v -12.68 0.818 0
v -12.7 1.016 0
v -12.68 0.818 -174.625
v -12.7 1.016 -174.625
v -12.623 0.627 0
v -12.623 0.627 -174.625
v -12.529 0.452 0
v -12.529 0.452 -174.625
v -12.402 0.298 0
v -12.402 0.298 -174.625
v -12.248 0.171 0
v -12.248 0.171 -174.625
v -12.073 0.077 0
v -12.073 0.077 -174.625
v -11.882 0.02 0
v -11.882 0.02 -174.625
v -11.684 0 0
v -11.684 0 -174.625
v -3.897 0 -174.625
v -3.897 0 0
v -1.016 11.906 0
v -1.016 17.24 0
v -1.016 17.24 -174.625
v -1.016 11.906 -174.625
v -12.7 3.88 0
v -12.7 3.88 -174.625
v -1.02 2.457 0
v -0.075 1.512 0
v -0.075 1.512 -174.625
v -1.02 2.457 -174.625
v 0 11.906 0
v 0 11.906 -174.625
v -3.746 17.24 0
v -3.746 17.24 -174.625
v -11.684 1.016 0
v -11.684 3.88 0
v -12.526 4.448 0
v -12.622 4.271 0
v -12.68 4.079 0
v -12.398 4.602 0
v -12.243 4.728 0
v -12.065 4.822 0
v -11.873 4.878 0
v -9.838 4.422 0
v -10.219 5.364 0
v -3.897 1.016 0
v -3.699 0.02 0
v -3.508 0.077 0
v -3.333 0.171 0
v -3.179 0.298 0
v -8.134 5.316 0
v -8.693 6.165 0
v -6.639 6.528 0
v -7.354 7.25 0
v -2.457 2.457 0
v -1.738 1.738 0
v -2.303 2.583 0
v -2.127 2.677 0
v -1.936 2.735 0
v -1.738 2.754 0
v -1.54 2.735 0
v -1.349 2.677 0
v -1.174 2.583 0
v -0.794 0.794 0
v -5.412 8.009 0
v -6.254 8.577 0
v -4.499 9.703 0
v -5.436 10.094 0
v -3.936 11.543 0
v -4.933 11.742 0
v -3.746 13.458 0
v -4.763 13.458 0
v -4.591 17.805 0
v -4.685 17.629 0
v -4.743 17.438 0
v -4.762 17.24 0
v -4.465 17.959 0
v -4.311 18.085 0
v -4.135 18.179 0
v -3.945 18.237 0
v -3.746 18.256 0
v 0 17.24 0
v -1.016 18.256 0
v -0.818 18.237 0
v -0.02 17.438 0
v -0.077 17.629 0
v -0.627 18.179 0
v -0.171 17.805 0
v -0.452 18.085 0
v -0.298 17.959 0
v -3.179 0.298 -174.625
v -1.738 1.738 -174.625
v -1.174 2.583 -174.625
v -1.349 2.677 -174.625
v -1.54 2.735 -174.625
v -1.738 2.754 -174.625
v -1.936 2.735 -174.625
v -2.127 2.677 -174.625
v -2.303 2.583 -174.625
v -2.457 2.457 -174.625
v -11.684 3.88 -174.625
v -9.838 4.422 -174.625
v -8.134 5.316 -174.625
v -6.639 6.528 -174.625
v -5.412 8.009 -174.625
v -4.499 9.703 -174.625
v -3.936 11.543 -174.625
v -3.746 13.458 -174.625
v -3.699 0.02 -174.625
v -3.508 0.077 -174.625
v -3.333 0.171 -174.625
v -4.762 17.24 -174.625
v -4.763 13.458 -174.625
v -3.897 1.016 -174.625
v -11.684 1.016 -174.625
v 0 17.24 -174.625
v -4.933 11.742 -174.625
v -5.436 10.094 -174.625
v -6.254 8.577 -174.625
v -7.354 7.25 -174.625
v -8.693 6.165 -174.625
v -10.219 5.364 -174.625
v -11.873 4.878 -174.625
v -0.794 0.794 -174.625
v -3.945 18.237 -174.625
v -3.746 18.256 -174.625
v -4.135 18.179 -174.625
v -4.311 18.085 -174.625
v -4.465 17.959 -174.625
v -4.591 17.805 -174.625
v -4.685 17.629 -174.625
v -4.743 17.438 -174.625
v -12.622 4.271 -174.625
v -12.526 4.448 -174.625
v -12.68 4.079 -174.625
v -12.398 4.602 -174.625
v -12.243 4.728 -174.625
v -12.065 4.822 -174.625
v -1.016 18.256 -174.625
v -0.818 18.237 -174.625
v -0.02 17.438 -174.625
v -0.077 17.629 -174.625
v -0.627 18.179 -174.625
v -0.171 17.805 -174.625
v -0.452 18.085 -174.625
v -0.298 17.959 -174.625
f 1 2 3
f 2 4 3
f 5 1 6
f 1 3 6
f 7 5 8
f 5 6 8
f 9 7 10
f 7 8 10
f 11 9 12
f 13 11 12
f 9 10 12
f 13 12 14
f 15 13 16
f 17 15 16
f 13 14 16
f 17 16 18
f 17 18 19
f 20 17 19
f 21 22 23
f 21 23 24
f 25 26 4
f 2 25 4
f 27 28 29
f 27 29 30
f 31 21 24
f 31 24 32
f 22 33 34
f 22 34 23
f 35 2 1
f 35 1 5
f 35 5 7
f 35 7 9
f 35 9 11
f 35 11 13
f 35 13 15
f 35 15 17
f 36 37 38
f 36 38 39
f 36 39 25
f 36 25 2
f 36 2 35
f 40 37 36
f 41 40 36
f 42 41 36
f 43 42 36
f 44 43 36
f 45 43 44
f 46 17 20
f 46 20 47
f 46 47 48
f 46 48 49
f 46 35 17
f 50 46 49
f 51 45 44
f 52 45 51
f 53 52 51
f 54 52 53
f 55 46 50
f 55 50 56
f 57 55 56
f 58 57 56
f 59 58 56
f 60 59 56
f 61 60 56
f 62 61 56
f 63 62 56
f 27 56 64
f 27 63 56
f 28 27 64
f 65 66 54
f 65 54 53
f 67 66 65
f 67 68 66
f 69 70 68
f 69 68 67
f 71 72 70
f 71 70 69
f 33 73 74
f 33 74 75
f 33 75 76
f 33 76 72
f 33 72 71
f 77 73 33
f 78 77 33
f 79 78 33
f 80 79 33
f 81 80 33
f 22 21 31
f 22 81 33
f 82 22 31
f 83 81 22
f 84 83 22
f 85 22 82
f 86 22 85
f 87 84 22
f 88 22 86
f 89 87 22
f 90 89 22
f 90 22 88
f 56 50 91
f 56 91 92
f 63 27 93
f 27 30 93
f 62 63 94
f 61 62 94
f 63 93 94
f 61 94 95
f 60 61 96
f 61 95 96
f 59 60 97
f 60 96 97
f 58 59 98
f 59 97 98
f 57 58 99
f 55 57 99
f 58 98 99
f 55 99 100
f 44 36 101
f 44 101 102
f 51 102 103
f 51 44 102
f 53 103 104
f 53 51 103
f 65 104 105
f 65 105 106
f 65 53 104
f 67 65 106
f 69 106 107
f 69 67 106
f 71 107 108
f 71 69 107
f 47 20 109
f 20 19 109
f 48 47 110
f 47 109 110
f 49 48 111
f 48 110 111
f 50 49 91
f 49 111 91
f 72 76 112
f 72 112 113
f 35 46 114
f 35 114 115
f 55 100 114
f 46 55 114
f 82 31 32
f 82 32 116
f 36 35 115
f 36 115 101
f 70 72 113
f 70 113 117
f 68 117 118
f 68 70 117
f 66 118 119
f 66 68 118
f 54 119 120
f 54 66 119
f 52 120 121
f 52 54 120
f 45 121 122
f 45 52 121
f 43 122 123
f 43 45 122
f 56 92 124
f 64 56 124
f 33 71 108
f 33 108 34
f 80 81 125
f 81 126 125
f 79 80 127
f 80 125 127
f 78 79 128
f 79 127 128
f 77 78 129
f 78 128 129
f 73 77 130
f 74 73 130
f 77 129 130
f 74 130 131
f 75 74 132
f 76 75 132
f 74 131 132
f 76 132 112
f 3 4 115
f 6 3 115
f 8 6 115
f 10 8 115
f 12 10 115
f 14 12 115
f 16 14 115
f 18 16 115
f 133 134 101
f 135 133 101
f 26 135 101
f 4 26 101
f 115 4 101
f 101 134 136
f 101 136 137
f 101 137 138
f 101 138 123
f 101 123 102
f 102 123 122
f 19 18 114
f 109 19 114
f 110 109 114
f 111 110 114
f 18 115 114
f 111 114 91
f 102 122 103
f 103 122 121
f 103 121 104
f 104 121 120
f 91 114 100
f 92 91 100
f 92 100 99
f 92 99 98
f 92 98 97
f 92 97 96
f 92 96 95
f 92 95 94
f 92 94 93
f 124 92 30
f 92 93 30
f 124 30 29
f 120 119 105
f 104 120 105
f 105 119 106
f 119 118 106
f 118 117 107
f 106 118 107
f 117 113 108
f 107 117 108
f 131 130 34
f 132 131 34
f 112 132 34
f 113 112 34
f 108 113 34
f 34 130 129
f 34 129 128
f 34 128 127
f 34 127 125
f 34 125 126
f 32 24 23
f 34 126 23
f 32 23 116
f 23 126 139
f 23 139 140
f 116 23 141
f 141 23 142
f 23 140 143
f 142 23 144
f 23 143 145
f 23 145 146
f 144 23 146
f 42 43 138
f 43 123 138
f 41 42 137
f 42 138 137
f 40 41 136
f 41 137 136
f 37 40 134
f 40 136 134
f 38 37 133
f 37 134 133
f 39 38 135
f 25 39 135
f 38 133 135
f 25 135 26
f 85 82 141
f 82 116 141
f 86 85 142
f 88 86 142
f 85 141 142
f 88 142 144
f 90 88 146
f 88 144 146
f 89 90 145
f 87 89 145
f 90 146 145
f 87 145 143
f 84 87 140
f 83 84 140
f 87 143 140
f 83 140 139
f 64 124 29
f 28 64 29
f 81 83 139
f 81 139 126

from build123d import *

# Parameters (mm, degrees)
BOSS_EXTRUDE1_DEPTH = 174.625
FILLET1_R           = 1.016


with BuildPart() as part:
    # Sketch1 → Boss-Extrude1 (new body)
    with BuildSketch(Plane.XY):
        with BuildLine():
            Line((0, 11.90625), (0, 18.25625))
            Line((0, 18.25625), (-4.7625, 18.25625))
            Line((-4.7625, 18.25625), (-4.7625, 13.4575956))
            ThreePointArc((-4.7625, 13.4575956), (-7.045294516, 7.570988051), (-12.7, 4.7625))
            Line((-12.7, 4.7625), (-12.7, 0))
            Line((-12.7, 0), (-3.476318041, 0))
            Line((-3.476318041, 0), (-1.738159021, 1.738159021))
            Line((-1.738159021, 1.738159021), (-0.79375, 0.79375))
            Line((-0.79375, 0.79375), (-0.07532951, 1.51217049))
            Line((-0.07532951, 1.51217049), (-1.738159021, 3.175))
            Line((-1.738159021, 3.175), (-3.897159021, 1.016))
            Line((-3.897159021, 1.016), (-11.684, 1.016))
            Line((-11.684, 1.016), (-11.684, 3.879825113))
            ThreePointArc((-11.684, 3.879825113), (-5.988786034, 7.237917278), (-3.7465, 13.4575956))
            Line((-3.7465, 13.4575956), (-3.7465, 17.24025))
            Line((-3.7465, 17.24025), (-1.016, 17.24025))
            Line((-1.016, 17.24025), (-1.016, 11.90625))
            Line((-1.016, 11.90625), (0, 11.90625))
        make_face()
    extrude(amount=-BOSS_EXTRUDE1_DEPTH)

    # Fillet1
    fillet1_edges = [part.edges().sort_by_distance(p)[0] for p in [
        (-1.738159021, 3.175, -87.3125),
        (-3.476318041, 0, -87.3125),
        (-12.7, 0, -87.3125),
        (-12.7, 4.7625, -87.3125),
        (-4.7625, 18.25625, -87.3125),
        (0, 18.25625, -87.3125),
    ]]
    fillet(fillet1_edges, radius=FILLET1_R)


solid = part.part
